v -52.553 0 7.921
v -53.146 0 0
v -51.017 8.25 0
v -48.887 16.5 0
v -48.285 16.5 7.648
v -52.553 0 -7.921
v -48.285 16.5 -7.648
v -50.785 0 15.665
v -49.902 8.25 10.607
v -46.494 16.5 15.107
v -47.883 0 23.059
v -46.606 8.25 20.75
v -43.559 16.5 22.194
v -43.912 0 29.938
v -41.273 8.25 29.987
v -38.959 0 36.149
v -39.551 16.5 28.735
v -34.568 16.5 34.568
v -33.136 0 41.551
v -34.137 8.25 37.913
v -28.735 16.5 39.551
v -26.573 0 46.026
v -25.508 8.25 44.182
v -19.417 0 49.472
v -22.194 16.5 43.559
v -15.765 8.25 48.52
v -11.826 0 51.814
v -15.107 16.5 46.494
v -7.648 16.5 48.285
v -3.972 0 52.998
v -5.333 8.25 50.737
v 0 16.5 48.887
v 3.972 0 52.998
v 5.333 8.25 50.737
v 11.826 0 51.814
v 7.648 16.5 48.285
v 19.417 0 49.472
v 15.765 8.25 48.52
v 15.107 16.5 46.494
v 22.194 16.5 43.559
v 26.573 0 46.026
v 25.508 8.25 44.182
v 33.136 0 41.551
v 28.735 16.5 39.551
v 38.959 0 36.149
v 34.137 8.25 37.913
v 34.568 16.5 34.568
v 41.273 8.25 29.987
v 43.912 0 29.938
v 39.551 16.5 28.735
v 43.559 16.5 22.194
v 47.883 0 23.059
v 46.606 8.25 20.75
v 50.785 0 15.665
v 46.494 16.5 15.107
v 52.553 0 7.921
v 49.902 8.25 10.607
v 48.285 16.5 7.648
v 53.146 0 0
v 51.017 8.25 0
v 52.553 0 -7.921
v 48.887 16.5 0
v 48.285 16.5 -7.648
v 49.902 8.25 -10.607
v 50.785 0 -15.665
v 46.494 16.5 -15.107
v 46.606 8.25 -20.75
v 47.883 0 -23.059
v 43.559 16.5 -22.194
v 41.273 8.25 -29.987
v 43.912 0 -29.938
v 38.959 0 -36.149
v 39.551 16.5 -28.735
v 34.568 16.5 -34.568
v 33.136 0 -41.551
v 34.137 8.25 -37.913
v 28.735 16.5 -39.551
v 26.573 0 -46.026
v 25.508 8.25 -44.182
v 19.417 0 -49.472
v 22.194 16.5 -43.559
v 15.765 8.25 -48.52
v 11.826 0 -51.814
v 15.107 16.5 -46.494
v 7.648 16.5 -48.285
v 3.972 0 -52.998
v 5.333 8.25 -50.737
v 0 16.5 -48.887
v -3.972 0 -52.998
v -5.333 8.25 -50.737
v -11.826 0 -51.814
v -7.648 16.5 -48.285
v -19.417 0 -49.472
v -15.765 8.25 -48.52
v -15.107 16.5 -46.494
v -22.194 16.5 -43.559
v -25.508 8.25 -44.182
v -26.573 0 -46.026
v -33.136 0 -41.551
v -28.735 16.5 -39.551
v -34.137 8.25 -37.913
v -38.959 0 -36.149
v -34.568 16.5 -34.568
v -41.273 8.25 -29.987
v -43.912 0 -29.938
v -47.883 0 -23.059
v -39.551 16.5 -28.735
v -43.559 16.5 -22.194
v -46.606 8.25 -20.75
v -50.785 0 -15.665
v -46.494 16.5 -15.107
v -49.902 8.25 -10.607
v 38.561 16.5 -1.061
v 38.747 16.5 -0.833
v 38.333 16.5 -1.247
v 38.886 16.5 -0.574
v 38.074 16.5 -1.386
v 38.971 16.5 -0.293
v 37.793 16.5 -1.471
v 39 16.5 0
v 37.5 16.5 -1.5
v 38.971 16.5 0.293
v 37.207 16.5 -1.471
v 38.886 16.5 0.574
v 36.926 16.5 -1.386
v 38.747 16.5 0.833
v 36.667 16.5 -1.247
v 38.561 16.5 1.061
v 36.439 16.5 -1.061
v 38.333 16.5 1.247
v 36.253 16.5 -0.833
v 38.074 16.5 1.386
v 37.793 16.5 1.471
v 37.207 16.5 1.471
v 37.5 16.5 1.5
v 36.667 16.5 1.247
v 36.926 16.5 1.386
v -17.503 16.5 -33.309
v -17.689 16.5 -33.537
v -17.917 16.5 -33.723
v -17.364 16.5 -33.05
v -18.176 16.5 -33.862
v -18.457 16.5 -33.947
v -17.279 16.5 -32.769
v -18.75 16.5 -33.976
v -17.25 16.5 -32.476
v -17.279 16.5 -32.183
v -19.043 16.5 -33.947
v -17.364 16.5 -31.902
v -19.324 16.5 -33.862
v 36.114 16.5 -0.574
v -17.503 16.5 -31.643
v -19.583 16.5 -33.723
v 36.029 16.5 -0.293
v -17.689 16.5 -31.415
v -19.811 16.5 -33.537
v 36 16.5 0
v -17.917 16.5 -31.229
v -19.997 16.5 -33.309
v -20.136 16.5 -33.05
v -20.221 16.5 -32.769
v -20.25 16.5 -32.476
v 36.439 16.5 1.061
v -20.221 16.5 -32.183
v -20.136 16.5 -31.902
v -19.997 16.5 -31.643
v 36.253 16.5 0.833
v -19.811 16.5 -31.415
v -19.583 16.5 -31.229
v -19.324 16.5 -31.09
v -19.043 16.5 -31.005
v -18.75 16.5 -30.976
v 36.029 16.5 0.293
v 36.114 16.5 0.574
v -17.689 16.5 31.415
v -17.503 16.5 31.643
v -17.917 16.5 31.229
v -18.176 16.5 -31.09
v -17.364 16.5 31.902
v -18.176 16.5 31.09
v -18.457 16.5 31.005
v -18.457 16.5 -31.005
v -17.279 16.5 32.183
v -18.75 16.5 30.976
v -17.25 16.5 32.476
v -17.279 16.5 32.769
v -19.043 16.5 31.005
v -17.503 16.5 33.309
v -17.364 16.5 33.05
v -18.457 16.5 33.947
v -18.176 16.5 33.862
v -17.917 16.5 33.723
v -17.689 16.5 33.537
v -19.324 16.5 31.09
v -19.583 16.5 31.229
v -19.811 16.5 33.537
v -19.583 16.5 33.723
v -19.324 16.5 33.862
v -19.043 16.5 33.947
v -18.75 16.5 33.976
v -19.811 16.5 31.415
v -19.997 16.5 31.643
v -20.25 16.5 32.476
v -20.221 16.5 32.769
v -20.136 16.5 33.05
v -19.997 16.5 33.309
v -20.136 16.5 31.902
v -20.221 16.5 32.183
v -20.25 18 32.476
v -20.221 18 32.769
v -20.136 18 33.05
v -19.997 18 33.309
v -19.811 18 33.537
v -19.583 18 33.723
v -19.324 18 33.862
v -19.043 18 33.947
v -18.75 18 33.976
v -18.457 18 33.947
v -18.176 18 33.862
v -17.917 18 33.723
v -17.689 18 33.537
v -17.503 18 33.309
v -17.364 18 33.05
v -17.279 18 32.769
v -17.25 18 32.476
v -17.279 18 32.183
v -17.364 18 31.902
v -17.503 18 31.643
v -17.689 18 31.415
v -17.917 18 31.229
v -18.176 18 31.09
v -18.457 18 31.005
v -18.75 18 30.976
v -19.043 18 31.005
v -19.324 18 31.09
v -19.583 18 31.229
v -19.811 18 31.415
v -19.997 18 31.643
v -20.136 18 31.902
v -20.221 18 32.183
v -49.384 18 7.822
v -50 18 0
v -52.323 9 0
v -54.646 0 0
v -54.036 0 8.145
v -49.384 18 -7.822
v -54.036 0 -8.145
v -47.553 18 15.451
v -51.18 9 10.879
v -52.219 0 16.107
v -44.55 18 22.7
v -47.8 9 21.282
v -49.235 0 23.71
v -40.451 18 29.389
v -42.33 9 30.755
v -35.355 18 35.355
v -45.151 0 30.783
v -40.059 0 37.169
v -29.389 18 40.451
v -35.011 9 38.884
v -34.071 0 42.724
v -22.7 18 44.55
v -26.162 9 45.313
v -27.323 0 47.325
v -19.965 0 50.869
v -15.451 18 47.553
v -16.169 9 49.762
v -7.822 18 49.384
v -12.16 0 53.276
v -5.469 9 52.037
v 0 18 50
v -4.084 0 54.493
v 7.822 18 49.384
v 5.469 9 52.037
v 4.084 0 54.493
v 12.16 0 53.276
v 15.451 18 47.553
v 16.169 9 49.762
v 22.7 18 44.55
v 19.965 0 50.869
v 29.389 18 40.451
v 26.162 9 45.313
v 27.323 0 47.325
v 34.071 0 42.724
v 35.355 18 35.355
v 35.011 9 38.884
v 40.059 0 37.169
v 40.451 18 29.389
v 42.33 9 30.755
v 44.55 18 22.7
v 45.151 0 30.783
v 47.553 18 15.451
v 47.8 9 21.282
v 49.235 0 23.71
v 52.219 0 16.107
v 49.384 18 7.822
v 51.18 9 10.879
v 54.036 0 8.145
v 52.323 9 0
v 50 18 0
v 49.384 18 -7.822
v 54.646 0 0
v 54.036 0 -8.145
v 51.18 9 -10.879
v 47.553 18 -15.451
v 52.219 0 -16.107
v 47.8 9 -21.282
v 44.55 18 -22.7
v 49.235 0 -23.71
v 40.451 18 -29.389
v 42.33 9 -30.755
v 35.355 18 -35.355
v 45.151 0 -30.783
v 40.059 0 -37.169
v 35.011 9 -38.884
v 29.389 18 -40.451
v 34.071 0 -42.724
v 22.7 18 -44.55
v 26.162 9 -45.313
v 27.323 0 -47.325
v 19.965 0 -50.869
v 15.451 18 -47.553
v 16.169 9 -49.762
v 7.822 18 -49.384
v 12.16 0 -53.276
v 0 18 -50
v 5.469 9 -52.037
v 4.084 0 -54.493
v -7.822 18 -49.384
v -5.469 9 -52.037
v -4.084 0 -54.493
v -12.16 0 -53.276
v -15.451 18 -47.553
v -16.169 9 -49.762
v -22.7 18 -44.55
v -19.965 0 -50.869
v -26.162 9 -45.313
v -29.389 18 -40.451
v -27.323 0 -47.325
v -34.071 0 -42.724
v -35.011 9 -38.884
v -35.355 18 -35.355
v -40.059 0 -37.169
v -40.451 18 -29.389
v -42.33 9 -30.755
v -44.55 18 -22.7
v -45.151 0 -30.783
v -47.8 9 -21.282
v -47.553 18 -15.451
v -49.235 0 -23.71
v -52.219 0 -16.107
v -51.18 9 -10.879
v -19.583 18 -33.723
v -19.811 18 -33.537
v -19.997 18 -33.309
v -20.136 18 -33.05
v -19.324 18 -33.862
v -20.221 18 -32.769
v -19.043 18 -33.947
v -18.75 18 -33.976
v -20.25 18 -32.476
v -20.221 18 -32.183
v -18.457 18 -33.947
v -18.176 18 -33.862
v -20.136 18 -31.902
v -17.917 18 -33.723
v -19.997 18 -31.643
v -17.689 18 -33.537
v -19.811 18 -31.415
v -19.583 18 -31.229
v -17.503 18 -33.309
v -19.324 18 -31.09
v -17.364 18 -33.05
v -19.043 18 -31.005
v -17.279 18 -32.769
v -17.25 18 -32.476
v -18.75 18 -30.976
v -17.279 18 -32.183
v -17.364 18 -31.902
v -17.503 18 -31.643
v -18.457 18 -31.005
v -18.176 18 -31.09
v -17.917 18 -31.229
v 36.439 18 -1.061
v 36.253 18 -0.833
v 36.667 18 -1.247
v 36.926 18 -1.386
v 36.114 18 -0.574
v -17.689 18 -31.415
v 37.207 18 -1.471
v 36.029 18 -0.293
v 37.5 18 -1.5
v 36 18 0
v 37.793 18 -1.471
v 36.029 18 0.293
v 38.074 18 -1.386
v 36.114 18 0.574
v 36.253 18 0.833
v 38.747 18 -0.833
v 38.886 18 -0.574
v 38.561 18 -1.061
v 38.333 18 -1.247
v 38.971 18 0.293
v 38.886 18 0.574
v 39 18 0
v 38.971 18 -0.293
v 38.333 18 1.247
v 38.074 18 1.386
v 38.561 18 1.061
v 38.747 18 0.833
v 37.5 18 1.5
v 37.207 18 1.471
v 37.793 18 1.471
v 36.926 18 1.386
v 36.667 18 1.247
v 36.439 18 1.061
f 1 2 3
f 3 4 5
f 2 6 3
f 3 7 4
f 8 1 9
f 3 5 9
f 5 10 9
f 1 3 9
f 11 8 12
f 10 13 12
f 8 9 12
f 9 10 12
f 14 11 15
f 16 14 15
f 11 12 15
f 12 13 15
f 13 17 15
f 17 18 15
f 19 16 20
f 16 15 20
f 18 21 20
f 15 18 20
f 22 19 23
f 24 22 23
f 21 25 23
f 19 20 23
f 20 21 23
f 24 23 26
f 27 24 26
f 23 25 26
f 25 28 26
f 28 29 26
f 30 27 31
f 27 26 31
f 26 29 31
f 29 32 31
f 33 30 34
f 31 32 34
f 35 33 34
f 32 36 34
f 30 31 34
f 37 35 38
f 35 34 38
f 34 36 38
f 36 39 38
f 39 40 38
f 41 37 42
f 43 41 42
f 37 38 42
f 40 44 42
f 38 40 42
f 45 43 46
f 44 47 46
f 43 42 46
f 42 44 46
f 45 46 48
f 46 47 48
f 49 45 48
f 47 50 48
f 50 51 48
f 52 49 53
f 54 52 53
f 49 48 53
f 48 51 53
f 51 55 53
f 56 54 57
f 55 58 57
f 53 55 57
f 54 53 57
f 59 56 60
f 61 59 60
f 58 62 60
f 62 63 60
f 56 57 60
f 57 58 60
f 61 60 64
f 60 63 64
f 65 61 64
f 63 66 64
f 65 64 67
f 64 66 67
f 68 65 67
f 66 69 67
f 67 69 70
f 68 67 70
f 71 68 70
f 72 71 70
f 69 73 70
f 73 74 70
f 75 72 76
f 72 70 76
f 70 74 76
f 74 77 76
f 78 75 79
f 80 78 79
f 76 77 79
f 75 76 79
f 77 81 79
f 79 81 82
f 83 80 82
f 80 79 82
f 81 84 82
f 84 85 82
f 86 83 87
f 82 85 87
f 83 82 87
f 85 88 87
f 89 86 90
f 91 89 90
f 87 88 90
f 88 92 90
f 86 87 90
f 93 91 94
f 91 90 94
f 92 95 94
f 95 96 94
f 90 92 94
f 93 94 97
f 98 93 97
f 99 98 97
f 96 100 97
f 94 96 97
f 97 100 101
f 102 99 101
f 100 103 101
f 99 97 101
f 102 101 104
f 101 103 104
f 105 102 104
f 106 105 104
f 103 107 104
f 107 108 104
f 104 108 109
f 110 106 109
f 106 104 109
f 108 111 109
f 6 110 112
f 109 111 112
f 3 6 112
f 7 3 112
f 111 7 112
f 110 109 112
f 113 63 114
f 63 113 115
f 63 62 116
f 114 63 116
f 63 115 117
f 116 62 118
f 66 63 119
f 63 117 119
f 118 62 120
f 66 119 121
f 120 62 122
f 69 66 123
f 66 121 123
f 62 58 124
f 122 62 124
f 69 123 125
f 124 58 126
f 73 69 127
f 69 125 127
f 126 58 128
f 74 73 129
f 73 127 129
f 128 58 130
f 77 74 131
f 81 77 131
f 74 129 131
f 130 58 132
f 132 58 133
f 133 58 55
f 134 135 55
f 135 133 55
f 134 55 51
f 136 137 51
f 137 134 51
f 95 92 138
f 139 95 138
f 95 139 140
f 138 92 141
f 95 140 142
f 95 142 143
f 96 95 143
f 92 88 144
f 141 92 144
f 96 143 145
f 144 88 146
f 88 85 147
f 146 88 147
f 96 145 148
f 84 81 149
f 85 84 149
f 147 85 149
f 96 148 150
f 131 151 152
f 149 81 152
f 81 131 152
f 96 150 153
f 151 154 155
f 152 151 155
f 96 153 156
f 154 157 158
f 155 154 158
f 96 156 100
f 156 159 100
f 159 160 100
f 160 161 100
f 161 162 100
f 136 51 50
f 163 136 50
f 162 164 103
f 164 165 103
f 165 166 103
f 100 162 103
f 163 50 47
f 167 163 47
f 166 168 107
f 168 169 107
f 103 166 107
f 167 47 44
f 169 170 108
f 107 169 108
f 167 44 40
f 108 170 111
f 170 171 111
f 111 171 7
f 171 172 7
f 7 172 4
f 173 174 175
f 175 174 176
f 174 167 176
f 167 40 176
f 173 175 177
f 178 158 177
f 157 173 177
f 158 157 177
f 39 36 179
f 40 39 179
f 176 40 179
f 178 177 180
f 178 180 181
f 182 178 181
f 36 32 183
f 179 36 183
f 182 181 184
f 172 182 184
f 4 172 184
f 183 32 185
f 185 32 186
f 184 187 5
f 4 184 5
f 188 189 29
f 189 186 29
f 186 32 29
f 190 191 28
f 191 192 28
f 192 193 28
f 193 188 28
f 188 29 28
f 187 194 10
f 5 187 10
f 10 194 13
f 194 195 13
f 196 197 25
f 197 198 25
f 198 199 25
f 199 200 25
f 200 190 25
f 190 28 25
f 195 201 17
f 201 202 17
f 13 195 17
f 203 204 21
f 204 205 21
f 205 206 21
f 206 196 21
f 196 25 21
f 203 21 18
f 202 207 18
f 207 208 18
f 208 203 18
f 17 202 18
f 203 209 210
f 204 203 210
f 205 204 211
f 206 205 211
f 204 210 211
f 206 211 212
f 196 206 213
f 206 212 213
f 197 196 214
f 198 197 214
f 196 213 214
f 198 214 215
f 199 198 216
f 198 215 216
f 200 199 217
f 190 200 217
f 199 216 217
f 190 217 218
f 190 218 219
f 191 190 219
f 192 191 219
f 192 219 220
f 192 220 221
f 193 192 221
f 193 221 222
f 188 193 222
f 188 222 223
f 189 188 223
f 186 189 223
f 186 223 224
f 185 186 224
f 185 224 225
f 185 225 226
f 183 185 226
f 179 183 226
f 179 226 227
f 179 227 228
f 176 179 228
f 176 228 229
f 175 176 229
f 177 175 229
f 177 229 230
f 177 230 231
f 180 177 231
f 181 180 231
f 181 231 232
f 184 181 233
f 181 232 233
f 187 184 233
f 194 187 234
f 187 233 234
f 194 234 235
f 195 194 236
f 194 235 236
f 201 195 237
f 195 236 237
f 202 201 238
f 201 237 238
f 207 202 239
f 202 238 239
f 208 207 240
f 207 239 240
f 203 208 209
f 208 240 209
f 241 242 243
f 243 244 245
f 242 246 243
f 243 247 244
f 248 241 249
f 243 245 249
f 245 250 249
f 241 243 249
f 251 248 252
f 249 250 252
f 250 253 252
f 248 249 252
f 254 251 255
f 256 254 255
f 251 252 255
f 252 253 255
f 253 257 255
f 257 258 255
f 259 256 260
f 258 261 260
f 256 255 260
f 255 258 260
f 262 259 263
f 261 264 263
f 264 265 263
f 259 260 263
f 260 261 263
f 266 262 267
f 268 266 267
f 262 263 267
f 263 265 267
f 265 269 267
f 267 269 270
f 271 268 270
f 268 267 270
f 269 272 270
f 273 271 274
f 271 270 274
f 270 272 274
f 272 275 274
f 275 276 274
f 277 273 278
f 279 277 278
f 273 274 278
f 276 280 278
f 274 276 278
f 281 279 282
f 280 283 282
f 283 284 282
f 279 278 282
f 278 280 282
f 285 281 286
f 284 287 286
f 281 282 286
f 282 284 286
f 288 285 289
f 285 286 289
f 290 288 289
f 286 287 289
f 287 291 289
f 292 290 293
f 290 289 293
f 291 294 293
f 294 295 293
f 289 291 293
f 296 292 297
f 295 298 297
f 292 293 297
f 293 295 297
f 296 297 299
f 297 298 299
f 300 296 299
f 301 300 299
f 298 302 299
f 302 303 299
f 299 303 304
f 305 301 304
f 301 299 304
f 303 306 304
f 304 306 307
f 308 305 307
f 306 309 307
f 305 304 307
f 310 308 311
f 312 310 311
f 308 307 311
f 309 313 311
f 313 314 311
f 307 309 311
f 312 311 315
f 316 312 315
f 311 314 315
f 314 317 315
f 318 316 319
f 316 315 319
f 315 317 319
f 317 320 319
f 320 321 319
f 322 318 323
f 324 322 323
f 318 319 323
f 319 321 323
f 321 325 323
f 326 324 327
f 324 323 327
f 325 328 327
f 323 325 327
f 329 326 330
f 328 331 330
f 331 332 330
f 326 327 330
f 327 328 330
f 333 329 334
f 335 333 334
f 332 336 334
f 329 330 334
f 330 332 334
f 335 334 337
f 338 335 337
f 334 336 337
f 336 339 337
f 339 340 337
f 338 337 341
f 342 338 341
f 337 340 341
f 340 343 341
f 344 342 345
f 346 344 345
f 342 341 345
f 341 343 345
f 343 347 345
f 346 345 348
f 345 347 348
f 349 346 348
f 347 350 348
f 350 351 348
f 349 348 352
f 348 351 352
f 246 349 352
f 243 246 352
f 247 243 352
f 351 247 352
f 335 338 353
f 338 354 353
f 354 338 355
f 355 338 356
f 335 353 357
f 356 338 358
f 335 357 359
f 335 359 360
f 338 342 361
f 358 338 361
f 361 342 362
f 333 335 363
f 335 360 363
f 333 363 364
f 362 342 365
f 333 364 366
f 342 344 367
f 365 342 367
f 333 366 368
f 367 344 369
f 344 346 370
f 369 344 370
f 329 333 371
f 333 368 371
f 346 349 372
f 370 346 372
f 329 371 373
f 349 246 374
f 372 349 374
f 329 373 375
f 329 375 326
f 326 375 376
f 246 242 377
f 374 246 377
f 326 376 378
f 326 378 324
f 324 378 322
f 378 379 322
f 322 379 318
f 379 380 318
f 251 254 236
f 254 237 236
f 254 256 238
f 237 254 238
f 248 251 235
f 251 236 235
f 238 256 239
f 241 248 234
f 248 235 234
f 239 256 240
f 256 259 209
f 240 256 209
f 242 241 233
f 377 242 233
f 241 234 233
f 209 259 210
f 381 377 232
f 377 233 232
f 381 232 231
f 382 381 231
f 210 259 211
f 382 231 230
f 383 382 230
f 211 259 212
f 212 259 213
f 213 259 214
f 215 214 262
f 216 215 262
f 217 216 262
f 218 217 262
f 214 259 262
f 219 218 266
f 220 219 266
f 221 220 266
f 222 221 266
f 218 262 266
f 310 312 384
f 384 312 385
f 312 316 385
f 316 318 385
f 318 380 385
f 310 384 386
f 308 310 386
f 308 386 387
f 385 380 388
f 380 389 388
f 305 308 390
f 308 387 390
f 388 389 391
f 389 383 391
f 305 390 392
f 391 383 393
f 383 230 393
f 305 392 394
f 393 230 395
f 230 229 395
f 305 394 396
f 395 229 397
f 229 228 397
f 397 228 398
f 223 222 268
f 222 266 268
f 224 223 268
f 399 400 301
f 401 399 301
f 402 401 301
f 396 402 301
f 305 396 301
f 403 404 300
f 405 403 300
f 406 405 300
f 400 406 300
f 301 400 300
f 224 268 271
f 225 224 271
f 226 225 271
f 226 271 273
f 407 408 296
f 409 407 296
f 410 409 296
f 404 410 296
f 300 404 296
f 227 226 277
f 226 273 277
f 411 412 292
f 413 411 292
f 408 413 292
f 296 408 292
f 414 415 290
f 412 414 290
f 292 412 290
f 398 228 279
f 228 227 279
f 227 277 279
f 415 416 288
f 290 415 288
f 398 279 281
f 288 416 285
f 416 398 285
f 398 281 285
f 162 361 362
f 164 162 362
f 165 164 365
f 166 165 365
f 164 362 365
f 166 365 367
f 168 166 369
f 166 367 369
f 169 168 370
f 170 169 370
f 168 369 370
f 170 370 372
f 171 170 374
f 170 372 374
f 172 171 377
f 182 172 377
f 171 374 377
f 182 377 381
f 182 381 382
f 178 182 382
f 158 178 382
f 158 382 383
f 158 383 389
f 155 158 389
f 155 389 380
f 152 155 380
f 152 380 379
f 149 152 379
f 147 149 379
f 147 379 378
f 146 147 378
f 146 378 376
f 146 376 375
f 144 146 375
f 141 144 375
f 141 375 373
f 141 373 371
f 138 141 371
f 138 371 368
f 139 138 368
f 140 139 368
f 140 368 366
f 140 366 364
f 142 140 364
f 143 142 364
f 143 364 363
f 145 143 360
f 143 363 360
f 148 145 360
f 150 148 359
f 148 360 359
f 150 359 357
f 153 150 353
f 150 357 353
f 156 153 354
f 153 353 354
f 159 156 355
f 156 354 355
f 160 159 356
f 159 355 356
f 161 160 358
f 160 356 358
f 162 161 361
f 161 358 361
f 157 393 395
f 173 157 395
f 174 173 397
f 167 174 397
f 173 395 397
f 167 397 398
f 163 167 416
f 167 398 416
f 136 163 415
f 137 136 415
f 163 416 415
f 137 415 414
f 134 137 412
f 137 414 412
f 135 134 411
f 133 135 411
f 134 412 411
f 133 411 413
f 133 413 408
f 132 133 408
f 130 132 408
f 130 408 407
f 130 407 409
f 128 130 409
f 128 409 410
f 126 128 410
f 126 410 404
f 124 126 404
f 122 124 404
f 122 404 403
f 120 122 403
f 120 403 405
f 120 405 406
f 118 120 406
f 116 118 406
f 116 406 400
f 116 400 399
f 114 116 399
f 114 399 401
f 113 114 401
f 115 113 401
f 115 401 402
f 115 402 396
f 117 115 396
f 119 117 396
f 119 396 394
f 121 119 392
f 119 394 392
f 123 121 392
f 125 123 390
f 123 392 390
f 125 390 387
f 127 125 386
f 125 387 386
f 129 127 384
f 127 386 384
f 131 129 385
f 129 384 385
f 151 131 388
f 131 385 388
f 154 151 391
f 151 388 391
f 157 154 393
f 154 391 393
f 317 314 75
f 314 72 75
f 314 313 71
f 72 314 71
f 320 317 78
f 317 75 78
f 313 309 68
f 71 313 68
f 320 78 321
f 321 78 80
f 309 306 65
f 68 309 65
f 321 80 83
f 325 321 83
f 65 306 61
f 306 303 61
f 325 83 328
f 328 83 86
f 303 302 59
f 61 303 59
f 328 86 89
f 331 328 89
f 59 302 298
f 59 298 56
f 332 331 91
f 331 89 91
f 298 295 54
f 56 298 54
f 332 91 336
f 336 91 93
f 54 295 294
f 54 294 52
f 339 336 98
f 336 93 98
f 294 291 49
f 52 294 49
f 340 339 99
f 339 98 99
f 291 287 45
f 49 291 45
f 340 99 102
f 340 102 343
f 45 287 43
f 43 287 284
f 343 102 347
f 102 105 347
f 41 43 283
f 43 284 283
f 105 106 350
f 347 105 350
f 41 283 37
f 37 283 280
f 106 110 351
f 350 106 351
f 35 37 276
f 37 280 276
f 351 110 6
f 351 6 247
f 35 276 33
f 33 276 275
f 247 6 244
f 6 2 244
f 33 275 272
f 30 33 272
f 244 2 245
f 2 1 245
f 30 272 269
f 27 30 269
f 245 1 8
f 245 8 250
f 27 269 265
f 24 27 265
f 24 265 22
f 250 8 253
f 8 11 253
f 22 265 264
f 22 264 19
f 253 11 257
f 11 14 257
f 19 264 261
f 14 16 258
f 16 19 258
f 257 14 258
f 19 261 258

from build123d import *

# Parameters (mm, degrees)
SKETCH001_R = 1.5
HOLE_DEPTH  = 25


with BuildPart() as part:
    # Sketch → Revolution (revolve)
    with BuildSketch(Plane.XY):
        Polygon((-54.6463, 0), (-53.1463, 0), (-48.887192, 16.5), (0, 16.5), (0, 18), (-50, 18), align=None)
    revolve(axis=Axis((0, 0, 0), (0, 1, 0)))

    # Sketch001 (on Face4 of Revolution) → Hole (cut)
    with BuildSketch(Plane(origin=(0, 18, 0), x_dir=(-1, 0, 0), z_dir=(0, 1, 0))):
        with Locations((-37.5, 0)):
            Circle(SKETCH001_R)
        with Locations((18.75, 32.475953)):
            Circle(SKETCH001_R)
        with Locations((18.75, -32.475953)):
            Circle(SKETCH001_R)
    extrude(amount=-HOLE_DEPTH, mode=Mode.SUBTRACT)


solid = part.part
